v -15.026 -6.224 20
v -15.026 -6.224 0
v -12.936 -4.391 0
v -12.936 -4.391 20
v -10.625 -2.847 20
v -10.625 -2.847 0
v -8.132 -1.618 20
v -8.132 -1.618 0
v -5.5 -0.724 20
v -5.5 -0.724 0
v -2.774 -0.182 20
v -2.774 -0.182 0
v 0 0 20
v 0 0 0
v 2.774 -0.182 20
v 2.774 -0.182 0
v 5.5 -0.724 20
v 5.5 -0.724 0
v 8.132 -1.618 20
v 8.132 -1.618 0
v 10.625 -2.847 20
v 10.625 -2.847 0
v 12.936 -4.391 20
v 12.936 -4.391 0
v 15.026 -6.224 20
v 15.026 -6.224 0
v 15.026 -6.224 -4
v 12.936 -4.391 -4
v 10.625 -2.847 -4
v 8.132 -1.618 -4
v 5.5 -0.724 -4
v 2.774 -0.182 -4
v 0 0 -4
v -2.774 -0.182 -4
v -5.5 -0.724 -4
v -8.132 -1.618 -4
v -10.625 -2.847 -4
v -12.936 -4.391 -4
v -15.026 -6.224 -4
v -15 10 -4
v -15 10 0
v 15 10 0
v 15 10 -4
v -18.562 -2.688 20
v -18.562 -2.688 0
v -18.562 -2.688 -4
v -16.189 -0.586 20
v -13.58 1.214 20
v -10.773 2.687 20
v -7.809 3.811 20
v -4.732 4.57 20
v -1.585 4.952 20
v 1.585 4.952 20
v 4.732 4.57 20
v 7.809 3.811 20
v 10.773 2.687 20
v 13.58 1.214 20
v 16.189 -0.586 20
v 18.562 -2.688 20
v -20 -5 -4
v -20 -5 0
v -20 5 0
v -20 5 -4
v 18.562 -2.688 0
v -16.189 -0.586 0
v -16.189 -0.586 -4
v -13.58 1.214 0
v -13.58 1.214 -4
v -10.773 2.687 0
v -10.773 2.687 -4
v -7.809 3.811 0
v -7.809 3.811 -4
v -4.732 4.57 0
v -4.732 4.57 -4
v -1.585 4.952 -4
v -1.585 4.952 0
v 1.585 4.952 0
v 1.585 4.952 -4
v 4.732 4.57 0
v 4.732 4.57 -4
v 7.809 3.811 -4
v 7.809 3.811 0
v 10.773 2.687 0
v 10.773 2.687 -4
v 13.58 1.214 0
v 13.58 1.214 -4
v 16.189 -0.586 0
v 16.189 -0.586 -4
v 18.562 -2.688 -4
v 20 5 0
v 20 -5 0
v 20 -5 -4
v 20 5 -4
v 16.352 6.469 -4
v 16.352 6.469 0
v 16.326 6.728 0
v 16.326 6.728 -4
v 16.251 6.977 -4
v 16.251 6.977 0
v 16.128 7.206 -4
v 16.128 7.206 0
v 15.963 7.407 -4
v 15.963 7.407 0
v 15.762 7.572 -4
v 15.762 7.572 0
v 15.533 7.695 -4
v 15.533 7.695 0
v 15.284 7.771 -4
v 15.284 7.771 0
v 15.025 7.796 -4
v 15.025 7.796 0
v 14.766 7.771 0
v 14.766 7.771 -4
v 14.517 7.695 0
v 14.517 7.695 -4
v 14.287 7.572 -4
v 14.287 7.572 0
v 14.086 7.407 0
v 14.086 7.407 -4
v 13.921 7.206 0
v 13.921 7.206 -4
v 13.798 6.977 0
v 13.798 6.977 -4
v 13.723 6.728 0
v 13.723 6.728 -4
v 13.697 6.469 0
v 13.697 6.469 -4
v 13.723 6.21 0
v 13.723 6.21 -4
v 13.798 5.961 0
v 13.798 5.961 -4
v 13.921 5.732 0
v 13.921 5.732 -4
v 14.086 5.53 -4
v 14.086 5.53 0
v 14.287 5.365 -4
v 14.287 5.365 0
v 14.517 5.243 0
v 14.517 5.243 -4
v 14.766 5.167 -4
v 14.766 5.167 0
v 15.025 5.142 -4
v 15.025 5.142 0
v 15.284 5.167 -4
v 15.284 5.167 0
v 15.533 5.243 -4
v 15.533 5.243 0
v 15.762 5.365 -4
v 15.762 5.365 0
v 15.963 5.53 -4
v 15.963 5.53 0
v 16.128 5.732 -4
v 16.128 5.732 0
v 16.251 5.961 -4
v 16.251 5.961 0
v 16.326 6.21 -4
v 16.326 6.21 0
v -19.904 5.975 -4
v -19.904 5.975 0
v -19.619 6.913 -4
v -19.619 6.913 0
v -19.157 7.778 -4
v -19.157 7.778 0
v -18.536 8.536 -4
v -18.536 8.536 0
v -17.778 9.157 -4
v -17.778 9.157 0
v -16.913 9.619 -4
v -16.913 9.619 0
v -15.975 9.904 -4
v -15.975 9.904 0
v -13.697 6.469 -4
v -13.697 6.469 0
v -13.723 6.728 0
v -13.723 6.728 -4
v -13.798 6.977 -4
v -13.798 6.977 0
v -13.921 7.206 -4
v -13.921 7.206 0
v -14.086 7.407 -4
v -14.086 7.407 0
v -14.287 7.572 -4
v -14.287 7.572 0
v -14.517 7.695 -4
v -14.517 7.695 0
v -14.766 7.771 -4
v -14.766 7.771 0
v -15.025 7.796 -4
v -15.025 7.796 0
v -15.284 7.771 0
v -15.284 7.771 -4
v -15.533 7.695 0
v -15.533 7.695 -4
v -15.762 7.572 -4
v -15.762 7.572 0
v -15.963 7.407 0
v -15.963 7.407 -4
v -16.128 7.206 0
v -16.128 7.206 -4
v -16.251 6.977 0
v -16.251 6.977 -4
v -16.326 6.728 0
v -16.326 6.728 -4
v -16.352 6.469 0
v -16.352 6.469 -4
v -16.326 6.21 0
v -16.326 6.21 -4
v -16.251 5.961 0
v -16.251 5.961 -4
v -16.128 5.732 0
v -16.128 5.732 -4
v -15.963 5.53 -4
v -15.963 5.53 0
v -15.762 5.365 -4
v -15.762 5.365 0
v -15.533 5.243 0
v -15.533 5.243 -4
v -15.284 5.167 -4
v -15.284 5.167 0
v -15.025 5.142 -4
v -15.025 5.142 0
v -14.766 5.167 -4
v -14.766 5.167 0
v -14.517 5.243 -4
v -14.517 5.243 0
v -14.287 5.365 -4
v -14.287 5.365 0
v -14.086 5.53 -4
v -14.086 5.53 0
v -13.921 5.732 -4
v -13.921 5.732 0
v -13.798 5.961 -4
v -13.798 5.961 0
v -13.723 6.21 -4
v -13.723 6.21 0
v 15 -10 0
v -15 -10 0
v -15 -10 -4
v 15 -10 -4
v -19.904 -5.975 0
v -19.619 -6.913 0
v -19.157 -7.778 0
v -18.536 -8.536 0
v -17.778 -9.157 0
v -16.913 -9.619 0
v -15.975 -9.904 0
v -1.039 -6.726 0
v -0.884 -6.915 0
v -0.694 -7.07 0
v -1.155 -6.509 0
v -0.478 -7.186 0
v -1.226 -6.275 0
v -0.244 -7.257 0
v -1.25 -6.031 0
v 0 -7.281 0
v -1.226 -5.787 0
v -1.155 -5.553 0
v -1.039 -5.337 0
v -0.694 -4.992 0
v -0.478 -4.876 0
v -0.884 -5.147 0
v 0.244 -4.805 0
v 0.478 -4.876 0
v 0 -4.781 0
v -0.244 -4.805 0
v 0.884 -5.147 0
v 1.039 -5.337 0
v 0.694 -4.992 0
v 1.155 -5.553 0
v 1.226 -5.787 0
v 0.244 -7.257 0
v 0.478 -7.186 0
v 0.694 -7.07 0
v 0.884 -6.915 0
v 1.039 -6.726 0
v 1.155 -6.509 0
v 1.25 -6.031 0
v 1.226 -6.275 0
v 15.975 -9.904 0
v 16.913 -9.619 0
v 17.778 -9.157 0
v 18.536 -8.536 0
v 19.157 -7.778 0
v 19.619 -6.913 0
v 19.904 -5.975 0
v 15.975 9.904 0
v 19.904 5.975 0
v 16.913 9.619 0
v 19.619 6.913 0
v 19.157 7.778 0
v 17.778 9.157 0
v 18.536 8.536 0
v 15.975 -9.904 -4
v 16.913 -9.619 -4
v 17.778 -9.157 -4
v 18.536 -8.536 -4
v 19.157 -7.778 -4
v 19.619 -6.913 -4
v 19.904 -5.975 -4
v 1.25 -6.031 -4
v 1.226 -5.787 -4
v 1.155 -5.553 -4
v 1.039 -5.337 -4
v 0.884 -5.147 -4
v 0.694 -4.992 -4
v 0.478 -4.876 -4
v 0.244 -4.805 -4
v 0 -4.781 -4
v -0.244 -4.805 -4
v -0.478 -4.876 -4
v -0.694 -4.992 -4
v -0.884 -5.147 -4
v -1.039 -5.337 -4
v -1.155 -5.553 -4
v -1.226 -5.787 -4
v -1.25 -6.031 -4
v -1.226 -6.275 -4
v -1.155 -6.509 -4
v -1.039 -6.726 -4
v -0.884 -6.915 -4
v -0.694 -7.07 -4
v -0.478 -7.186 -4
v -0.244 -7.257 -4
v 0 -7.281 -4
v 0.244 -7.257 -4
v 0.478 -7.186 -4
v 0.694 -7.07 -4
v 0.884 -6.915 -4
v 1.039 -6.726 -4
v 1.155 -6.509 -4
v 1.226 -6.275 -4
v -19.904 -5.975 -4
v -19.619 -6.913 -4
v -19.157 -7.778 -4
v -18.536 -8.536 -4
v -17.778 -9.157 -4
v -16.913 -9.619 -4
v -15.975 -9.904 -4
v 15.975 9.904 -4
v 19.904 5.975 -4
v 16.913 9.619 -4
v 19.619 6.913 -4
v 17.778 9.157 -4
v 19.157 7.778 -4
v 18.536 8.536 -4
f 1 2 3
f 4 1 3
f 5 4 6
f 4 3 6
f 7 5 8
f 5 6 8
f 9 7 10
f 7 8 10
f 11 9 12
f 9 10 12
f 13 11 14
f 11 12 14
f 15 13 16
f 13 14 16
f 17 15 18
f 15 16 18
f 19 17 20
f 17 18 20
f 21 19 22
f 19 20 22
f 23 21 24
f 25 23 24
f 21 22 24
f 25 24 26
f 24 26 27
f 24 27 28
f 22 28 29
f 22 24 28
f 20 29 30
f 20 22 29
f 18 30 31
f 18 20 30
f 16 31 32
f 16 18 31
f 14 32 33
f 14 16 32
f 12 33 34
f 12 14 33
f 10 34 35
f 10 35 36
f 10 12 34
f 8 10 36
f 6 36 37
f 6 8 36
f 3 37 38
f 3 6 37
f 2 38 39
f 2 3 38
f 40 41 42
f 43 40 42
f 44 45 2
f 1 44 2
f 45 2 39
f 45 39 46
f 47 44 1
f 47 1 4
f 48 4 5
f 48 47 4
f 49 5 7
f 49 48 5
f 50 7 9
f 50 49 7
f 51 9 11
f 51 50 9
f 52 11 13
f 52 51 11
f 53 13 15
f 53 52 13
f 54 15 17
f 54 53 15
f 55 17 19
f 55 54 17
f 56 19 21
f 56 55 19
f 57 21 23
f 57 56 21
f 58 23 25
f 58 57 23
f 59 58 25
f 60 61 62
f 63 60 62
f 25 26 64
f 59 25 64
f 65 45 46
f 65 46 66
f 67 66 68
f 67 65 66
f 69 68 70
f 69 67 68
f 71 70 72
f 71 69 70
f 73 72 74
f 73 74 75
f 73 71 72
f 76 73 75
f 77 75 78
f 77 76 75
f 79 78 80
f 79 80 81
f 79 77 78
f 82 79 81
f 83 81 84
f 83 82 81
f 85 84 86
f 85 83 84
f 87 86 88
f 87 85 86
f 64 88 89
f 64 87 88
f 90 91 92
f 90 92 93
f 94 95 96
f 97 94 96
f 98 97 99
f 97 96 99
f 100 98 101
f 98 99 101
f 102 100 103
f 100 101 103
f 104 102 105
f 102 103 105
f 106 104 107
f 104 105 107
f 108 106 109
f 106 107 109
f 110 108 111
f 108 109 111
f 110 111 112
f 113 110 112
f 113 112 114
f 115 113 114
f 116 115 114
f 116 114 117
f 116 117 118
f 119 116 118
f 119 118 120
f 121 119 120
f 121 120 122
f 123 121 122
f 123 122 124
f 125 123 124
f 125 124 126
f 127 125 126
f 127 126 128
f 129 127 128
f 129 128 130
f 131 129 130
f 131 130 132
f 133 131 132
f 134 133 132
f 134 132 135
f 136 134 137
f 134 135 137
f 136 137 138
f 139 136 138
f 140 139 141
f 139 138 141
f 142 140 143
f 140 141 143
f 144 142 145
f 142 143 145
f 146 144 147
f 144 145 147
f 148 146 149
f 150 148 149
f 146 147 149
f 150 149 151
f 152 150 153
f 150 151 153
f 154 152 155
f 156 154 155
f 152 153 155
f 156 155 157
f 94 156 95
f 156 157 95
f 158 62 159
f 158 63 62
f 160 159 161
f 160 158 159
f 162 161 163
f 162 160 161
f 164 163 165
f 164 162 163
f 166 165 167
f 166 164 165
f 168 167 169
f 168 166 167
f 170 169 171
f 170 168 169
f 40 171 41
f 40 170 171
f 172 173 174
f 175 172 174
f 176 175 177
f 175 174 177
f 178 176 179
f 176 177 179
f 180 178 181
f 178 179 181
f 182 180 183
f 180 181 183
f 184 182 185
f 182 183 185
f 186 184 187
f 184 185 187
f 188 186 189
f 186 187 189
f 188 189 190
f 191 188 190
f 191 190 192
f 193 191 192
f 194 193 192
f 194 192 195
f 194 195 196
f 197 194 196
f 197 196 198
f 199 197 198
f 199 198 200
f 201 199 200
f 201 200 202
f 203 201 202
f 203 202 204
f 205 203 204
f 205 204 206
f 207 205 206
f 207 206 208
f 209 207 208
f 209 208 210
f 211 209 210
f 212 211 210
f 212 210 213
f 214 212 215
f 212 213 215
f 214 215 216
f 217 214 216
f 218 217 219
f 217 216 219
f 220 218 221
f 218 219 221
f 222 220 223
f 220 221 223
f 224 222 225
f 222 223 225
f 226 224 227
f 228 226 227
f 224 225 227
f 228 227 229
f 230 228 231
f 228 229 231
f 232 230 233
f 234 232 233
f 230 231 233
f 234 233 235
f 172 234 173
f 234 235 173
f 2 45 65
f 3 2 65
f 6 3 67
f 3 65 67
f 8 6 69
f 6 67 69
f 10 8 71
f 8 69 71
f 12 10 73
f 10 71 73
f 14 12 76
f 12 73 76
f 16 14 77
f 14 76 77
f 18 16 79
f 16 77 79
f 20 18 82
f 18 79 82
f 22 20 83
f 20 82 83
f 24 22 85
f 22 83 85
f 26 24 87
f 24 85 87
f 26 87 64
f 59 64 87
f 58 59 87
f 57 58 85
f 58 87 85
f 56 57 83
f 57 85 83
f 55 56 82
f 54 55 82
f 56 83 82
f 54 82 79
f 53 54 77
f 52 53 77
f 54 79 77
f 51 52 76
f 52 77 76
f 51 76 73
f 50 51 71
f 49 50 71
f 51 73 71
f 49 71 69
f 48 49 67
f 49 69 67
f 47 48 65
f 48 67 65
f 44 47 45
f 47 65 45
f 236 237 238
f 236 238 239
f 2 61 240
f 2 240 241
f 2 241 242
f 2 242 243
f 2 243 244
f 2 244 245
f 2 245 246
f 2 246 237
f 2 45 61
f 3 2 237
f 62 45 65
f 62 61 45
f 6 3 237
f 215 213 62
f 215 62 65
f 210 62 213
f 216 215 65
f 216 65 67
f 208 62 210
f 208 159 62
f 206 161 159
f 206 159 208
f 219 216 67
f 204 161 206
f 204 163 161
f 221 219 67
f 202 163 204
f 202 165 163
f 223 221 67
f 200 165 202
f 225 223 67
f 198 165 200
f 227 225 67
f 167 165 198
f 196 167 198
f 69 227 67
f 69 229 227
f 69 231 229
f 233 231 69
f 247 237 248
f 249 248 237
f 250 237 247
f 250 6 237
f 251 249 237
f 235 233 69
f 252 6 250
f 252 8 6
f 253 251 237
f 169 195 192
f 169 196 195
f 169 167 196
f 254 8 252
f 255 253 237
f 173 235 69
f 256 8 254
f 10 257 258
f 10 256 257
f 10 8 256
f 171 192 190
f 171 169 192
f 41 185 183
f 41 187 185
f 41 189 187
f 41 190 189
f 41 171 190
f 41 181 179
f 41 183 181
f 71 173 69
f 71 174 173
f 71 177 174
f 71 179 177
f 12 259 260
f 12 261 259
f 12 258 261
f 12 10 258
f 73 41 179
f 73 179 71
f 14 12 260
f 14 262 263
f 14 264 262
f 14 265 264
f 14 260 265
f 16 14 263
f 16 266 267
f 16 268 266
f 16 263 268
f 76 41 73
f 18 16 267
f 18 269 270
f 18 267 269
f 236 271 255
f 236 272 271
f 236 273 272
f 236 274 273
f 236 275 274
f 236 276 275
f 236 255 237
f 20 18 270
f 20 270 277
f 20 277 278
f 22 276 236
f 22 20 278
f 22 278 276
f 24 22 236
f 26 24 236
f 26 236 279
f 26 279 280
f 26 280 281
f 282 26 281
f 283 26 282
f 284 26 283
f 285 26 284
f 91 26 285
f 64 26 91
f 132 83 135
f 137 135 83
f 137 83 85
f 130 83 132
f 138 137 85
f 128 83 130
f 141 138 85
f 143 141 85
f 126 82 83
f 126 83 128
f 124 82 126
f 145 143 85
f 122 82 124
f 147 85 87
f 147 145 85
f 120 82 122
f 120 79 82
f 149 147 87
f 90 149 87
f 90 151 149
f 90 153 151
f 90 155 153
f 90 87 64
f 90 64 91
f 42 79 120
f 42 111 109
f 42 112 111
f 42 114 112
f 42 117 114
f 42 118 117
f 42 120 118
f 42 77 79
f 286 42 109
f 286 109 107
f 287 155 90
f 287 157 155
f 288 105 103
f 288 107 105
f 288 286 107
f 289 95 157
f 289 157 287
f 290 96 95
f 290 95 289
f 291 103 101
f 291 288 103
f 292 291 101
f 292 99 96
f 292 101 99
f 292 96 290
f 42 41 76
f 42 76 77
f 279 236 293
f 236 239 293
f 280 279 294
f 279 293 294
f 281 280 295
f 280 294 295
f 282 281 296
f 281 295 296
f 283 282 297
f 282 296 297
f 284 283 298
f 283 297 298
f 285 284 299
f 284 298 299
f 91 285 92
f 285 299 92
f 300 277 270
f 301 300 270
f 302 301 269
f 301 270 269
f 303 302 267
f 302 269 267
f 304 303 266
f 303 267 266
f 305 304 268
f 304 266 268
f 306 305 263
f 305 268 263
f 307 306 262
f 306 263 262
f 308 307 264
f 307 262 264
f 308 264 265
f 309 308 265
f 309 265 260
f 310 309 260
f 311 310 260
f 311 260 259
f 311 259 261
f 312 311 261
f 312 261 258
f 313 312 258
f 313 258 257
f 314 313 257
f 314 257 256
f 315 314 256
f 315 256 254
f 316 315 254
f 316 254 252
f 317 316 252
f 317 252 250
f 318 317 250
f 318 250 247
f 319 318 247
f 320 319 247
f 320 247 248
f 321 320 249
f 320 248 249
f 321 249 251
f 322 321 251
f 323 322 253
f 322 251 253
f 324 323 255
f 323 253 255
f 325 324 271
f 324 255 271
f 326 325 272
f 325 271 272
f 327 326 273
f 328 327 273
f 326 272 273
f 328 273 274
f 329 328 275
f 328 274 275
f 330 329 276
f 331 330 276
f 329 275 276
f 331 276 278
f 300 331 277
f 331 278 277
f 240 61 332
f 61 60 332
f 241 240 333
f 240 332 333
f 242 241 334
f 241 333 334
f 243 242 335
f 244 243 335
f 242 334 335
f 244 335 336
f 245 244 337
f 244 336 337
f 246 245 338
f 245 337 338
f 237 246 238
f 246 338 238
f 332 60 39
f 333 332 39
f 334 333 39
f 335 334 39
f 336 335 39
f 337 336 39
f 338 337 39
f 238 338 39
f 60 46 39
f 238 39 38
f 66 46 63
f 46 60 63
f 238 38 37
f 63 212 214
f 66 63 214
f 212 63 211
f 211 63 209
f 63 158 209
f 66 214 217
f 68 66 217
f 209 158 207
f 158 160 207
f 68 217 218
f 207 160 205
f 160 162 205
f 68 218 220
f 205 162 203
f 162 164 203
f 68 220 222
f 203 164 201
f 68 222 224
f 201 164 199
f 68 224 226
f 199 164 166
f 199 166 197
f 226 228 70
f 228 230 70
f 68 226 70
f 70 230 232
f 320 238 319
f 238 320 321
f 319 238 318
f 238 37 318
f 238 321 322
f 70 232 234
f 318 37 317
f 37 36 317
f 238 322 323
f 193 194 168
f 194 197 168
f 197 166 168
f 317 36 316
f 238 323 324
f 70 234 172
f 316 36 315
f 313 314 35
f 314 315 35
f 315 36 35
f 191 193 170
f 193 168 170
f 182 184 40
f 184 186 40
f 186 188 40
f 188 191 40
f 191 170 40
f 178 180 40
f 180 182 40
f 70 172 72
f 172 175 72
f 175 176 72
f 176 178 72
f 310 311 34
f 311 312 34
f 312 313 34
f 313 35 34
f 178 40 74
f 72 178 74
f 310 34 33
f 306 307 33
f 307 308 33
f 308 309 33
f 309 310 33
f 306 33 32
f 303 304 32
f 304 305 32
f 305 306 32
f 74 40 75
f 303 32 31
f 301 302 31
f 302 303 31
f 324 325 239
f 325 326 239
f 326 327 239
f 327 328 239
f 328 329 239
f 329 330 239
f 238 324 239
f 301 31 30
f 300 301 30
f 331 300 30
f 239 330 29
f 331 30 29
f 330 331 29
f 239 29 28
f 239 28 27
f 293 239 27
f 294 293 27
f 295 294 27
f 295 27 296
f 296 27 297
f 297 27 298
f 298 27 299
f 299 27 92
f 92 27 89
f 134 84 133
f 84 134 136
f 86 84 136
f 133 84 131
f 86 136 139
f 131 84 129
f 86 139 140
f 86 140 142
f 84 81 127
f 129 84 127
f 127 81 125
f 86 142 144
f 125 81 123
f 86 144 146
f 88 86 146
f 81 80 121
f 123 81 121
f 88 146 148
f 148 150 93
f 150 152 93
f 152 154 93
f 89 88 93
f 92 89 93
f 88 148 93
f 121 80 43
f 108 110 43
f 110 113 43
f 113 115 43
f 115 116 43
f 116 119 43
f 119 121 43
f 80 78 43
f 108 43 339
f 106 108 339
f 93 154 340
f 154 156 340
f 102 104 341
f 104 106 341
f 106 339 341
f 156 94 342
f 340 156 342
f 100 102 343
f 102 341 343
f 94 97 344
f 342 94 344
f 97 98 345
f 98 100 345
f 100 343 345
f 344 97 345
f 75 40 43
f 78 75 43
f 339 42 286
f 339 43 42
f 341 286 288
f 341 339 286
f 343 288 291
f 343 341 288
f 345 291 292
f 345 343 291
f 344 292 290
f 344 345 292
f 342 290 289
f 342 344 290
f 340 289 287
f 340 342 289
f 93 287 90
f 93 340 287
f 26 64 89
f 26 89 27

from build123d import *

# Parameters (mm, degrees)
BOSS_EXTRUDE1_DEPTH     = 20
SKETCH1_3_W             = 40
SKETCH1_3_H             = 20
BOSS_EXTRUDE2_DEPTH     = 4
FILLET1_R               = 5
CUT_EXTRUDE1_DEPTH      = 31
CUT_EXTRUDE1_DEPTH_BACK = 31
SKETCH2_R               = 1.327157312
SKETCH2_R_2             = 1.25


with BuildPart() as part:
    # Sketch1 → Boss-Extrude1 (new body)
    with BuildSketch(Plane.XY):
        with BuildLine():
            Line((15.0260191, -6.2239809), (18.561553006, -2.688446994))
            ThreePointArc((18.561553006, -2.688446994), (0, 5), (-18.561553006, -2.688446994))
            Line((-18.561553006, -2.688446994), (-15.0260191, -6.2239809))
            ThreePointArc((-15.0260191, -6.2239809), (0, 0), (15.0260191, -6.2239809))
        make_face()
    extrude(amount=BOSS_EXTRUDE1_DEPTH)


with BuildPart() as body_2:
    # Sketch1<3> → Boss-Extrude2 (new body)
    with BuildSketch(Plane.XY):
        Rectangle(SKETCH1_3_W, SKETCH1_3_H)
        with BuildLine():
            Line((18.561553006, -2.688446994), (15.0260191, -6.2239809))
            ThreePointArc((15.0260191, -6.2239809), (0, 0), (-15.0260191, -6.2239809))
            Line((-15.0260191, -6.2239809), (-18.561553006, -2.688446994))
            ThreePointArc((-18.561553006, -2.688446994), (0, 5), (18.561553006, -2.688446994))
        make_face(mode=Mode.SUBTRACT)
    extrude(amount=-BOSS_EXTRUDE2_DEPTH)

    # Fillet1
    fillet1_edges = [body_2.edges().sort_by_distance(p)[0] for p in [
        (20, 10, -2),
        (20, -10, -2),
        (-20, -10, -2),
        (-20, 10, -2),
    ]]
    fillet(fillet1_edges, radius=FILLET1_R)

    # Sketch2 → Cut-Extrude1 (cut, two sides: drawn at the far end of the back side and taken through both)
    with BuildSketch(Plane.XY.offset(-CUT_EXTRUDE1_DEPTH_BACK)):
        with Locations((15.024623413, 6.468859218)):
            Circle(SKETCH2_R)
        with Locations((0, -6.031140782)):
            Circle(SKETCH2_R_2)
        with Locations((-15.024623413, 6.468859218)):
            Circle(SKETCH2_R)
    extrude(amount=CUT_EXTRUDE1_DEPTH + CUT_EXTRUDE1_DEPTH_BACK, mode=Mode.SUBTRACT)


solid = Compound([part.part, body_2.part])
